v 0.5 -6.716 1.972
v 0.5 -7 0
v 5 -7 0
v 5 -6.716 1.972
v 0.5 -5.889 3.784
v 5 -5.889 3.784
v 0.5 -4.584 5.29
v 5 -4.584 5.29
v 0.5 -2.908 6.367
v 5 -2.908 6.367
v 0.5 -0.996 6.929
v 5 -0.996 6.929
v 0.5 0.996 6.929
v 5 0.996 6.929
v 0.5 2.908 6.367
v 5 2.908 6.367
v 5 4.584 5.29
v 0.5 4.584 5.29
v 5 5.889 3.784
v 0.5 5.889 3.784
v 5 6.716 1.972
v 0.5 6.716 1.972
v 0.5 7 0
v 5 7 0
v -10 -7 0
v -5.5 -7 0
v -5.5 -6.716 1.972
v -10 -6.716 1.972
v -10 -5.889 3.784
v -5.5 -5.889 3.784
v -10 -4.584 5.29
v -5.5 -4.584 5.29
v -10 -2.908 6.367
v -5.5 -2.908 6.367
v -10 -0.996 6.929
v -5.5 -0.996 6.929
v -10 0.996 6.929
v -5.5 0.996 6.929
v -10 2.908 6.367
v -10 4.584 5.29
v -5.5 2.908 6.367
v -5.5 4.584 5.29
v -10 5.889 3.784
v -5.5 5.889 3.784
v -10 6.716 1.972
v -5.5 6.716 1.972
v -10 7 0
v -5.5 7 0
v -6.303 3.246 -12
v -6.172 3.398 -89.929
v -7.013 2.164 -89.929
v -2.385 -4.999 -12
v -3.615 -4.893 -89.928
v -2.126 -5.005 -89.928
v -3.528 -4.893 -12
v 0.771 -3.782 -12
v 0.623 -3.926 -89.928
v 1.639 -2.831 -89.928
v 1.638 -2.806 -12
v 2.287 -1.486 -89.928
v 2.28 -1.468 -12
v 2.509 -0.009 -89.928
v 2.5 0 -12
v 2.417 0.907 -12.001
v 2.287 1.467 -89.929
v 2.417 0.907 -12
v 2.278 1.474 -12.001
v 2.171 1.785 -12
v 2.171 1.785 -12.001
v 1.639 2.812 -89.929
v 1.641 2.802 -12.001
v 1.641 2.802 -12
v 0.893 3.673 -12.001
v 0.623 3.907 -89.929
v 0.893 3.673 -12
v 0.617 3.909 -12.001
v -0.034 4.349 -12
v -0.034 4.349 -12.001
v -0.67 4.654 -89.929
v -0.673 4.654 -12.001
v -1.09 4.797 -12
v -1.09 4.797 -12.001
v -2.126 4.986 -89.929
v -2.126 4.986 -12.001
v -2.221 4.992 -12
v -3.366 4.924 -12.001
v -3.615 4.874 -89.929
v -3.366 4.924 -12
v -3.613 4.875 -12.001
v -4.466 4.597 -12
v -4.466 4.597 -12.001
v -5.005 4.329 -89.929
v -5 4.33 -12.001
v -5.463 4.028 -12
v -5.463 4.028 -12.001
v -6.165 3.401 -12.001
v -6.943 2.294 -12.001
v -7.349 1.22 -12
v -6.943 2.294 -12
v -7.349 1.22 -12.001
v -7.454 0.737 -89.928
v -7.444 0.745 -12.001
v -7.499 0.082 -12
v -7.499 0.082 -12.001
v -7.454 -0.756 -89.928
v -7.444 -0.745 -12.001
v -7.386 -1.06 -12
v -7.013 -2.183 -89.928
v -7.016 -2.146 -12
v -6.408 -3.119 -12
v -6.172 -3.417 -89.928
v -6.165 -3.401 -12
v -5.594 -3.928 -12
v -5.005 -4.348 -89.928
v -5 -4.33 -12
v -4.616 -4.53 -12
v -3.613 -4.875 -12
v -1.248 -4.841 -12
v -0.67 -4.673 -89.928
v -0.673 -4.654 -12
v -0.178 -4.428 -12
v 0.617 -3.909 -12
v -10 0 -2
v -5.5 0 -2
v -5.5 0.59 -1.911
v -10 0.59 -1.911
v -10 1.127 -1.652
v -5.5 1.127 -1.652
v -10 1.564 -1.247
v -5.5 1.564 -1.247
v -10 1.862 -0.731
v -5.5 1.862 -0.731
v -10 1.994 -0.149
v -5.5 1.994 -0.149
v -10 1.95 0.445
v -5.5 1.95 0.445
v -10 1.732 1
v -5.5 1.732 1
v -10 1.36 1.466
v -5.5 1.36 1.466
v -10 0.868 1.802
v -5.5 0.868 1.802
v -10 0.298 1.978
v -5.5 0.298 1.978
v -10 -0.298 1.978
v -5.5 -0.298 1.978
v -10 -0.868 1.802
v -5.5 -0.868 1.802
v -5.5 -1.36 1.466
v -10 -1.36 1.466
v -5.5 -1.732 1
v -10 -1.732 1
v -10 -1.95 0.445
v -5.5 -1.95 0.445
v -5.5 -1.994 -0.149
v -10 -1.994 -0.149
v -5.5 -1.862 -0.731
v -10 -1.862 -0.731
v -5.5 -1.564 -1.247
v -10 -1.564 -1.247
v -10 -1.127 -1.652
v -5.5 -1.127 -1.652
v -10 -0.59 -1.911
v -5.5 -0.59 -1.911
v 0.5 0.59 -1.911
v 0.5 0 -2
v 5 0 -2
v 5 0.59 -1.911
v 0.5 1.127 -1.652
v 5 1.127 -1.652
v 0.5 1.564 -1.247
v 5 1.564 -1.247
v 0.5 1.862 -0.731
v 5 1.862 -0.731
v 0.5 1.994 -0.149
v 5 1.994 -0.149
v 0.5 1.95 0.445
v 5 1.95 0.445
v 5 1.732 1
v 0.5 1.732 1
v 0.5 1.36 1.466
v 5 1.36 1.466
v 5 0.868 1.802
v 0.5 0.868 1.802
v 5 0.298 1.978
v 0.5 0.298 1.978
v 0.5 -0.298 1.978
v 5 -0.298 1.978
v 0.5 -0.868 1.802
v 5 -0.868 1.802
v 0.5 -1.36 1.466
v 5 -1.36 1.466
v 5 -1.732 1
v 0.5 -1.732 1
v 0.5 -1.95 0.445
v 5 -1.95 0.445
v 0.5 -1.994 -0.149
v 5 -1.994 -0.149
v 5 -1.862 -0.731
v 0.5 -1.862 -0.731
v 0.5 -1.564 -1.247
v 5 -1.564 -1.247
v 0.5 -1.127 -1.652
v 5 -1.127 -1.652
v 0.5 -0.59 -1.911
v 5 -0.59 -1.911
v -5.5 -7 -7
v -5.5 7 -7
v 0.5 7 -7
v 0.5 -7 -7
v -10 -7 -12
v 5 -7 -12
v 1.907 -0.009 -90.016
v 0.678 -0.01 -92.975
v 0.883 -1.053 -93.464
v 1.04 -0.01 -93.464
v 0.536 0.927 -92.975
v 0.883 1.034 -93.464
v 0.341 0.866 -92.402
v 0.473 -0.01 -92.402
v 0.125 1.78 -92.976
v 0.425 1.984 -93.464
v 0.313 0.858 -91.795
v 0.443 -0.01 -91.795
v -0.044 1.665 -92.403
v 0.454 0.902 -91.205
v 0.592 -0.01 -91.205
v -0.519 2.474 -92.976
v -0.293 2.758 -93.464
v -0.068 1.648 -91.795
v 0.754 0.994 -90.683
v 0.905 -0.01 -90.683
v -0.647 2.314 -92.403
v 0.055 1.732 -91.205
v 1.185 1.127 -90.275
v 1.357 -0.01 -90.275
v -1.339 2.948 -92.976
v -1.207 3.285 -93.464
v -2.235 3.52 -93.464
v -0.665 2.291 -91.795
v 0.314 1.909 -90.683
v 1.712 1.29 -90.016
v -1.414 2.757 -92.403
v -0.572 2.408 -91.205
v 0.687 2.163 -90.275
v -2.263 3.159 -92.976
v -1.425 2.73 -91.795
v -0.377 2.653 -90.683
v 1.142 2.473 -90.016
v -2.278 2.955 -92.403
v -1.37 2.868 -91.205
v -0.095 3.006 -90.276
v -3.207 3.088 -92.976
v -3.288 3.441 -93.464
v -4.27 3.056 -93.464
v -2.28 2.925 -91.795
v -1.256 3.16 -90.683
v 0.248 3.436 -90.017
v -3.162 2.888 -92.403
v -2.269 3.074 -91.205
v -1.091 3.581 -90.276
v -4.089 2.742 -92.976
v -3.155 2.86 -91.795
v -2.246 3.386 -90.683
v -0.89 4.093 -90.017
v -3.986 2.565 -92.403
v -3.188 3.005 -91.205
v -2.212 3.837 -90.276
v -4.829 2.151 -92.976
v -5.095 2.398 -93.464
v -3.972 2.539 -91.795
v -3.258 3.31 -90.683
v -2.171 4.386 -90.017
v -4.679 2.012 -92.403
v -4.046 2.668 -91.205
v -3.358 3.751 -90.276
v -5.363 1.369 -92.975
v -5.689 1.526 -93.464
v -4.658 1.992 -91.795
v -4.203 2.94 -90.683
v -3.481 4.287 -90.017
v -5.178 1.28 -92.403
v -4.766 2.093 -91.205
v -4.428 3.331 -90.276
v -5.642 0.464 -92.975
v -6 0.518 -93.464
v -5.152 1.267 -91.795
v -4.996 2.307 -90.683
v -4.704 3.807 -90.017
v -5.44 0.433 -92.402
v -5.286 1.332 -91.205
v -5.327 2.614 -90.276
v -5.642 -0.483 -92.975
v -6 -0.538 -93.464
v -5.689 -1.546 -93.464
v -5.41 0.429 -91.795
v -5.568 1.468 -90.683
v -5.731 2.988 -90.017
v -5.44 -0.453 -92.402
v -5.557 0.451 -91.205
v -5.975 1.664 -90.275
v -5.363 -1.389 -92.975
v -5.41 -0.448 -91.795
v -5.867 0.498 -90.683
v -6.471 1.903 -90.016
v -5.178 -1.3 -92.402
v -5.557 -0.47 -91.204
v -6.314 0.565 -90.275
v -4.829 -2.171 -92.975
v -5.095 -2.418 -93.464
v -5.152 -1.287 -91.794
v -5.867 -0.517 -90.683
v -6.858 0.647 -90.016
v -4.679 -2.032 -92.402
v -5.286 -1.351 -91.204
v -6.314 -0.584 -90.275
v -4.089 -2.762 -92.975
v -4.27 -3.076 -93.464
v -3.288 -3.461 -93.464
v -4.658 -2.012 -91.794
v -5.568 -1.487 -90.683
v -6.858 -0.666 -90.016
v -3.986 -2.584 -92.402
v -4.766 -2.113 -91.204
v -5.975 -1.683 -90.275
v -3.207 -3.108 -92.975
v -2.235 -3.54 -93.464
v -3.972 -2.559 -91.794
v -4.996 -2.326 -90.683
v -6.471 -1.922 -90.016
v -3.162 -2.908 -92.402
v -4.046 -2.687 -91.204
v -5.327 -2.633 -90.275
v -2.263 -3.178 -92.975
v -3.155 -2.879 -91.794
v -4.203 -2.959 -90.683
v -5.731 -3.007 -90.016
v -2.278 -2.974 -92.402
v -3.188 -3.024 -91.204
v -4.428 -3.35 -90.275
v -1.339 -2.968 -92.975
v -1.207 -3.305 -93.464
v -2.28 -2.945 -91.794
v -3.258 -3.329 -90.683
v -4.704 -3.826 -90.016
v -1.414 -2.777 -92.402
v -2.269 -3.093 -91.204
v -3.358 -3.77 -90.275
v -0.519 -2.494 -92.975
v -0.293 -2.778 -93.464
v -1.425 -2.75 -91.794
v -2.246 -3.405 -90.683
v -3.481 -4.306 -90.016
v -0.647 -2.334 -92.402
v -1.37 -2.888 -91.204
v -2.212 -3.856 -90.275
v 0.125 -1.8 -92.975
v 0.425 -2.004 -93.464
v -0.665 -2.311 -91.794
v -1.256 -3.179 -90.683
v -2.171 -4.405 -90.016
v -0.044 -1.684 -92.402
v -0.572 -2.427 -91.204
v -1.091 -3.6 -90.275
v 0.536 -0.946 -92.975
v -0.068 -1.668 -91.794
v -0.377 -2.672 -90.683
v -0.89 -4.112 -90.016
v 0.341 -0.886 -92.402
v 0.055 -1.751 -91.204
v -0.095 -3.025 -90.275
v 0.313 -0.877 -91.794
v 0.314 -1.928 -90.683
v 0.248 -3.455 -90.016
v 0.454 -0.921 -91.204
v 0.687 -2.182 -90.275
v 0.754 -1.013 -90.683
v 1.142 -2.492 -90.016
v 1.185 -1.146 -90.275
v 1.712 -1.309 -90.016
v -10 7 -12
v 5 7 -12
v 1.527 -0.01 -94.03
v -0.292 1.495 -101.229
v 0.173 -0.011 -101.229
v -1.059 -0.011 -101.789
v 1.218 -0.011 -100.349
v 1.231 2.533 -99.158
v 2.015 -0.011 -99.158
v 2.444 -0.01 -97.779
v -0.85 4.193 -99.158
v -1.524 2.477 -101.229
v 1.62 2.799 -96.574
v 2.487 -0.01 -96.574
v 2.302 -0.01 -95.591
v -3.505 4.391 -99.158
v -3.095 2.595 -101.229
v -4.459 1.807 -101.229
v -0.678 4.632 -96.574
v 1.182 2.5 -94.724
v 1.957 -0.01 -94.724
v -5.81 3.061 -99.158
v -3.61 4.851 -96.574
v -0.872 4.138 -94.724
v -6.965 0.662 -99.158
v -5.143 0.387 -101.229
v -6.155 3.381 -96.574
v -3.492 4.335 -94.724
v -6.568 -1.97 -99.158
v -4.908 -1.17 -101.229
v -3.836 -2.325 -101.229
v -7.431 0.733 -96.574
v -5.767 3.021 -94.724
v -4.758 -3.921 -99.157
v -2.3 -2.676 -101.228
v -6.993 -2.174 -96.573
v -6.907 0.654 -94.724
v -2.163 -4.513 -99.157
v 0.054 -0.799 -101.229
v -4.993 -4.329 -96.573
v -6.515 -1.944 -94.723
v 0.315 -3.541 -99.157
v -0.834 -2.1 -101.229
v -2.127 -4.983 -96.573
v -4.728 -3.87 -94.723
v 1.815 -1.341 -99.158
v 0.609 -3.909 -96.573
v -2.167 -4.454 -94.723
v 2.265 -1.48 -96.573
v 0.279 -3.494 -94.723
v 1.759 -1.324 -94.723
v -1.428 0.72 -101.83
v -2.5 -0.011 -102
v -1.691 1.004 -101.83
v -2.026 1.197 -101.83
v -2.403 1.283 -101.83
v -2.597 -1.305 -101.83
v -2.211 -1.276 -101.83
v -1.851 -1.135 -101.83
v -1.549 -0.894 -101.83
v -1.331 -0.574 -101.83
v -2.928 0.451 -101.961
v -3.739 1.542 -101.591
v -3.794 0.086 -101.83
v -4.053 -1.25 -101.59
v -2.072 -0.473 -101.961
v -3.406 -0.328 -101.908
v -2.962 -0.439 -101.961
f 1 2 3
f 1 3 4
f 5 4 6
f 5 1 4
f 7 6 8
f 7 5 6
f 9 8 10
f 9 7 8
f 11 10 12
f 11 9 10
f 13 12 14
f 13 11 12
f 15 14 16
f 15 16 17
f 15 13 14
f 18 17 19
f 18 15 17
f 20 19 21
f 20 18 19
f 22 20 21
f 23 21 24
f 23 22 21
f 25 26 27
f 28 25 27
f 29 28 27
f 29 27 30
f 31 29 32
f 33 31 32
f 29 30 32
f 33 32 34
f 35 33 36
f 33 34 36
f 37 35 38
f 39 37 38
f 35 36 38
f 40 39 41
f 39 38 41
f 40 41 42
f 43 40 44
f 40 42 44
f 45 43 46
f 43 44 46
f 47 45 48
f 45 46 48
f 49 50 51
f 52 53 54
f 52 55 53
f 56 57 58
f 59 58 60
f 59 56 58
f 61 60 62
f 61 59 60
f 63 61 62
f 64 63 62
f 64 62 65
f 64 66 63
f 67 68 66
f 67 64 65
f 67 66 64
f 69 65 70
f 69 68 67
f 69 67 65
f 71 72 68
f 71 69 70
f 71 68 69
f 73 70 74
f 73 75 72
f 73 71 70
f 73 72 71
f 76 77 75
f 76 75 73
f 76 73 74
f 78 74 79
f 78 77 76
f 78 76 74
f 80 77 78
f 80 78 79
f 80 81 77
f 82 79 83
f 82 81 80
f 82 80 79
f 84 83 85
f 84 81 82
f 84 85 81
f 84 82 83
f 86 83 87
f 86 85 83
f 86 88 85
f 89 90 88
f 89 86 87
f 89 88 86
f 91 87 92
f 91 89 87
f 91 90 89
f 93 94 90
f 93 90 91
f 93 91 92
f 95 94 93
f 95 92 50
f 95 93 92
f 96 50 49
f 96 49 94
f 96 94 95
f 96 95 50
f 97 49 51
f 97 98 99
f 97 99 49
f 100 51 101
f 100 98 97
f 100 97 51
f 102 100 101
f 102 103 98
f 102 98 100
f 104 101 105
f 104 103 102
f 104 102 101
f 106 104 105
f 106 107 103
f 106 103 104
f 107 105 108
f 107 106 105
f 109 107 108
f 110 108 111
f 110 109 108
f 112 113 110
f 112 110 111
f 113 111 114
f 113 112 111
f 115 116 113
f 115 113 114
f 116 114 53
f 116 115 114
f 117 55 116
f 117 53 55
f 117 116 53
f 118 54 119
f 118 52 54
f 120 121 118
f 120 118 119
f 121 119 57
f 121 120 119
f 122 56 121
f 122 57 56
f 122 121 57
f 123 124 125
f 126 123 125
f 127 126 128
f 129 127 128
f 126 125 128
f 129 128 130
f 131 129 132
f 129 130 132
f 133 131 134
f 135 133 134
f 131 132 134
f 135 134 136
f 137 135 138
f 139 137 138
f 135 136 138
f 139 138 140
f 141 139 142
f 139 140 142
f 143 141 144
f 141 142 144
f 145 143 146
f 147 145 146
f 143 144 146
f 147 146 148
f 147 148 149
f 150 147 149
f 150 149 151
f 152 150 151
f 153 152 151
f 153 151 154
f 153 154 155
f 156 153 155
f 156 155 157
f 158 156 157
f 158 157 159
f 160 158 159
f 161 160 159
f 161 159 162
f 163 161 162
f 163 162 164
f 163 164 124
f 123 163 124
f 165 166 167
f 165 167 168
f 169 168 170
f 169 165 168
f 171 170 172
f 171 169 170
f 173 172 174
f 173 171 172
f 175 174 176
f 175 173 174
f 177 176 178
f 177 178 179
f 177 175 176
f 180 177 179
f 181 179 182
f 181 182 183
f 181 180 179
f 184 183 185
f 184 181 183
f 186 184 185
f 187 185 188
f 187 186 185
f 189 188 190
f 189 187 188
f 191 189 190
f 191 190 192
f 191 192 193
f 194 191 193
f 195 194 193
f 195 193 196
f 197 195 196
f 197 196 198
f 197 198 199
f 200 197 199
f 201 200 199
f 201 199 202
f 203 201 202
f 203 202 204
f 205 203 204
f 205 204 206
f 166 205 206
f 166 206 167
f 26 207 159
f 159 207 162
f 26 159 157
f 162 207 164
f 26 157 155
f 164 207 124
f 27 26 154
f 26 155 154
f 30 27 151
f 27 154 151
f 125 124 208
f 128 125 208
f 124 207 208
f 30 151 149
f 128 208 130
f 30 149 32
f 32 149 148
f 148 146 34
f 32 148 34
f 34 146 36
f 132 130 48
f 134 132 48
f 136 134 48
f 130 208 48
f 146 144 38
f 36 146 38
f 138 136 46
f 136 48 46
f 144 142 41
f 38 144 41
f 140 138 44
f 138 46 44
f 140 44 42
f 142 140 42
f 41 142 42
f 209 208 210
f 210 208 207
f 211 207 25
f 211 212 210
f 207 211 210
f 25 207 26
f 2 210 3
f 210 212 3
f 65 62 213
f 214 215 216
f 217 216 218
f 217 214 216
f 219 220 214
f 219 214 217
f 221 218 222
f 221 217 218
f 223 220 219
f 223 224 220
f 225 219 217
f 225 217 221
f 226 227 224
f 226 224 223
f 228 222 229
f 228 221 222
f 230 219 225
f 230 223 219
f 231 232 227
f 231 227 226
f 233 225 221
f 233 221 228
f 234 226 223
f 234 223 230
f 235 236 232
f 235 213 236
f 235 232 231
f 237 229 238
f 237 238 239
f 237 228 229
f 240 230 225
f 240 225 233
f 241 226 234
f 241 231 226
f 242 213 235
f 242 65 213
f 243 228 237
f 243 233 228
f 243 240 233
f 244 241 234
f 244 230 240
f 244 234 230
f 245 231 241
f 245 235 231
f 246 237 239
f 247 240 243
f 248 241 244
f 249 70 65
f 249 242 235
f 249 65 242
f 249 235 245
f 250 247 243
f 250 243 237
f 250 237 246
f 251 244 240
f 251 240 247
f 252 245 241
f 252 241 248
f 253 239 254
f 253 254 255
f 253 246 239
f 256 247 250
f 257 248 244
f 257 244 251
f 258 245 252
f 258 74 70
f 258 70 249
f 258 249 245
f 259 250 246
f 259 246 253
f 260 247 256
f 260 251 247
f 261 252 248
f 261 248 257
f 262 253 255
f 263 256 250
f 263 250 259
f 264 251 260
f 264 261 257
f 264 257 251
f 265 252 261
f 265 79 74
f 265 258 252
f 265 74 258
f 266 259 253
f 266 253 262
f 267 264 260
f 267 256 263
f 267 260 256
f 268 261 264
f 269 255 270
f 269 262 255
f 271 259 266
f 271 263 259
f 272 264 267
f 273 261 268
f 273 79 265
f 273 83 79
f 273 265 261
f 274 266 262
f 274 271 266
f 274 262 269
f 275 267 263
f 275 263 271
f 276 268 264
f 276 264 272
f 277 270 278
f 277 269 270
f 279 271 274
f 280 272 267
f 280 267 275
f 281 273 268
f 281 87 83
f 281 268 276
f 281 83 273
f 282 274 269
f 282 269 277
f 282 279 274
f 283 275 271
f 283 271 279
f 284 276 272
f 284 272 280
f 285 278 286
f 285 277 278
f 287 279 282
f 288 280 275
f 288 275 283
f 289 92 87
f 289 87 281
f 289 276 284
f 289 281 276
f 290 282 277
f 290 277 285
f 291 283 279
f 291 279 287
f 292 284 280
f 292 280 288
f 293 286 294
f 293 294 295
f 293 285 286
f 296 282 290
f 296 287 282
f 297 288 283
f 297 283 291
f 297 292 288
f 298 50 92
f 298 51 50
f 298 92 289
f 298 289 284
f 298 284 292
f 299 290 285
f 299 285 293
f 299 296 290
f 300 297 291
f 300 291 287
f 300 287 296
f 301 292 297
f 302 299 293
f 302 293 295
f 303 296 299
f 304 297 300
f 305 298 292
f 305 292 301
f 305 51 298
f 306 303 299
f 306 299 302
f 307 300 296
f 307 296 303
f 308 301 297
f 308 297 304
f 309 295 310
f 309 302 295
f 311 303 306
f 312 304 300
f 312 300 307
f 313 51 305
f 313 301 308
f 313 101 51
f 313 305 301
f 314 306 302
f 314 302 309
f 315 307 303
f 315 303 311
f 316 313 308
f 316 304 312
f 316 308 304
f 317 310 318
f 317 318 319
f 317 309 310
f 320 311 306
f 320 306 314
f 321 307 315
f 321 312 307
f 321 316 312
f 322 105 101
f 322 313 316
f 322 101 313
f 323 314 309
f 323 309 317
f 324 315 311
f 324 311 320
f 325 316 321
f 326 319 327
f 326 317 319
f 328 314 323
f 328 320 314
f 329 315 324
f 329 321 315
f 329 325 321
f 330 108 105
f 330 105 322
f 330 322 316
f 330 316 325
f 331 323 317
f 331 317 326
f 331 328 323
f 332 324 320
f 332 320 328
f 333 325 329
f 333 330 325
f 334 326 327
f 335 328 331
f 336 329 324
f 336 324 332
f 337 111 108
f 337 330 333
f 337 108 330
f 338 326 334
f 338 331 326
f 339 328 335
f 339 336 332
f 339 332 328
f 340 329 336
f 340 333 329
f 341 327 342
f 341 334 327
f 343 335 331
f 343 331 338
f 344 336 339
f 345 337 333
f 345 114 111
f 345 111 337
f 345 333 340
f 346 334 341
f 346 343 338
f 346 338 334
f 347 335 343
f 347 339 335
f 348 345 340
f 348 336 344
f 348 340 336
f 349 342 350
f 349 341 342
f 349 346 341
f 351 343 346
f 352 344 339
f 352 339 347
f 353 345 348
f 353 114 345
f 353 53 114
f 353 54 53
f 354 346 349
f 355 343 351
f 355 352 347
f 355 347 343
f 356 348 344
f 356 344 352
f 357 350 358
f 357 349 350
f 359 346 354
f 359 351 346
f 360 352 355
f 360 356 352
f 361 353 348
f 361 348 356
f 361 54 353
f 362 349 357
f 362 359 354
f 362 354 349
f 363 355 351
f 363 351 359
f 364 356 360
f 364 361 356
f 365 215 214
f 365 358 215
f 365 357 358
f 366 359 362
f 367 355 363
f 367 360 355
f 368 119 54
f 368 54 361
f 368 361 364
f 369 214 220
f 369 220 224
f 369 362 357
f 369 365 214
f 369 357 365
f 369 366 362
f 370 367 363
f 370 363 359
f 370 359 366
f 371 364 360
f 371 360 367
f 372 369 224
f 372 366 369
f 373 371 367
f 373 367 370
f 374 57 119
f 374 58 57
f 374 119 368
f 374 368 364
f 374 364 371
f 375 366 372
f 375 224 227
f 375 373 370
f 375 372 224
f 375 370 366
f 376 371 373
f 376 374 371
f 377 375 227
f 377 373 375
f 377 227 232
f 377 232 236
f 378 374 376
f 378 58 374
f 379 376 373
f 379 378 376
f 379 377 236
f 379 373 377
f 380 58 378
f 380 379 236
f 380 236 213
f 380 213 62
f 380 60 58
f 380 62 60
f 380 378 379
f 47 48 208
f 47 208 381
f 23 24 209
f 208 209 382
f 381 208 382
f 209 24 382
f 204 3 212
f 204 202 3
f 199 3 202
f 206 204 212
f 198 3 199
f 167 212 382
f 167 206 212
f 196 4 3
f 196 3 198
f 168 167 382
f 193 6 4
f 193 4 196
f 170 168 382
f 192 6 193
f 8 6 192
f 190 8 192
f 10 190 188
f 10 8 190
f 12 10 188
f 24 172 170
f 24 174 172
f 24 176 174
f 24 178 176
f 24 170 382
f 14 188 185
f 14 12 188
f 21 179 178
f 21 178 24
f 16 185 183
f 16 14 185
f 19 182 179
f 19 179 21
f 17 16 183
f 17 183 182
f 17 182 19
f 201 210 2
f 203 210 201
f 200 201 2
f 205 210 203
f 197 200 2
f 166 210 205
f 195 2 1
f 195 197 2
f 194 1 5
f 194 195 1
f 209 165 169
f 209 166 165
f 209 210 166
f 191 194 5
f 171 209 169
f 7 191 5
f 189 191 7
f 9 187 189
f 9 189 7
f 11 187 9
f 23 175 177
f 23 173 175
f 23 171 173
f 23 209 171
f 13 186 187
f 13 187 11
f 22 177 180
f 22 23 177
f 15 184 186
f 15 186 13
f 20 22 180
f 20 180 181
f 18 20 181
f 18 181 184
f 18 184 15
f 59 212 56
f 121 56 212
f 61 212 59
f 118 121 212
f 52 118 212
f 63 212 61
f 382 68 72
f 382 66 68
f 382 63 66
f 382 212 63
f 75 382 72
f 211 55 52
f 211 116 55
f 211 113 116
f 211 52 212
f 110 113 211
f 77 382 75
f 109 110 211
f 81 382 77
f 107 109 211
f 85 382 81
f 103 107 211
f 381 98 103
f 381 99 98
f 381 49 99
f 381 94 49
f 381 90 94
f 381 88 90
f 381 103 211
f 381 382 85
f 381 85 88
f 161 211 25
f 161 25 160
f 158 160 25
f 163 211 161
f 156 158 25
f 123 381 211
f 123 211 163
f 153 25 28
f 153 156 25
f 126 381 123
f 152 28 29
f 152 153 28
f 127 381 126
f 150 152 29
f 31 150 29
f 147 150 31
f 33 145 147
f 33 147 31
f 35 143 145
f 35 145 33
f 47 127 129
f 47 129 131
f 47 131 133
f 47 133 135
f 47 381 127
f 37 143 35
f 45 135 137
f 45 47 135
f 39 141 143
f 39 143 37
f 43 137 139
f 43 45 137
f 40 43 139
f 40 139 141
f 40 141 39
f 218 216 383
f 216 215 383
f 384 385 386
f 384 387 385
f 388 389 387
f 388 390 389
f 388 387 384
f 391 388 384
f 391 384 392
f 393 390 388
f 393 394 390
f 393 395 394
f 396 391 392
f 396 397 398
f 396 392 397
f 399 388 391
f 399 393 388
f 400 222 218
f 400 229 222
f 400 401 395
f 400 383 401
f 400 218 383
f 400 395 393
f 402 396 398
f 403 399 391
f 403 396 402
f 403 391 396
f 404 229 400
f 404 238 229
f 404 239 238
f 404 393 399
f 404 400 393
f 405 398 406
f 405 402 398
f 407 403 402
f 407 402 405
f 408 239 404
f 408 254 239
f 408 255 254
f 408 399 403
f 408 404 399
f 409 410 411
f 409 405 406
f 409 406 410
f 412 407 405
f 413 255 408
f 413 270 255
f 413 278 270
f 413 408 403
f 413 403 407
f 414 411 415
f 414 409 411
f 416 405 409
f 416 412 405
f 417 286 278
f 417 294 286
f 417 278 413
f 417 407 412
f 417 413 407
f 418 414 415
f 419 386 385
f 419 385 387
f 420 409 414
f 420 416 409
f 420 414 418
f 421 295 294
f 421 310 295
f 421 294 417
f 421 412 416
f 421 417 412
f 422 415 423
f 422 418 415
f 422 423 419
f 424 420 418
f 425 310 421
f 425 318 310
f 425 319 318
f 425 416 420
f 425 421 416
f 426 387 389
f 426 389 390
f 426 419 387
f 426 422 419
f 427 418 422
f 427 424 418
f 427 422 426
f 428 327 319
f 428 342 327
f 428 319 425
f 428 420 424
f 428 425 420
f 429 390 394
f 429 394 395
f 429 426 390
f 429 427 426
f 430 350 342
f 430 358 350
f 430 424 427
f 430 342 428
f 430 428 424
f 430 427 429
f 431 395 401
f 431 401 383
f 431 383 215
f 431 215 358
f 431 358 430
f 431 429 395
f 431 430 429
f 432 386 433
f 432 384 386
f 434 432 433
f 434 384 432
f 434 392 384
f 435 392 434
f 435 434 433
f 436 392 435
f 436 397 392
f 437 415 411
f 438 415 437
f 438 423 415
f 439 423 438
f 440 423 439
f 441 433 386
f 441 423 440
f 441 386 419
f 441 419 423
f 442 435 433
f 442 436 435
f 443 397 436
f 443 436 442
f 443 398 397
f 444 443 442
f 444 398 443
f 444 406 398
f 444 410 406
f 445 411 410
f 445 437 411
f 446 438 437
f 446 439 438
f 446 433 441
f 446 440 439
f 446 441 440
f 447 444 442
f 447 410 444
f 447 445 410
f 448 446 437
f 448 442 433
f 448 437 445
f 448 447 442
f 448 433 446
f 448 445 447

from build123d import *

# Parameters (mm, degrees)
SKETCH_1_R          = 2
EXTRUDE_1_DEPTH     = 5
SKETCH_2_W          = 15
SKETCH_2_H          = 14
EXTRUDE_2_DEPTH     = 5
CUT_EXTRUDE_1_DEPTH = 0.5
CUT_EXTRUDE_2_DEPTH = 0.5


# Read off the part's stored shape, not the designer's step: 旋转1
with BuildPart() as part:
    # 草图1 → 凸台-拉伸1 (new body)
    with BuildSketch(Plane(origin=(0, 0, 0), x_dir=(0, 0, -1), z_dir=(1, 0, 0))):
        with BuildLine():
            Line((0, 7), (7, 7))
            Line((7, 7), (7, -7))
            Line((7, -7), (0, -7))
            ThreePointArc((0, -7), (-7, 0), (0, 7))
        make_face()
        Circle(SKETCH_1_R, mode=Mode.SUBTRACT)
    extrude_1 = extrude(amount=EXTRUDE_1_DEPTH)

    # 草图2 → 凸台-拉伸2 (add)
    with BuildSketch(Plane(origin=(0, 0, -7), x_dir=(-1, 0, 0), z_dir=(0, 0, -1))):
        with Locations((2.5, 0)):
            Rectangle(SKETCH_2_W, SKETCH_2_H)
    extrude(amount=EXTRUDE_2_DEPTH)

    # 镜向1: 凸台-拉伸1 across plane
    add(extrude_1.mirror(Plane(origin=(-2.5, 0, 0), x_dir=(0, 0, 1), z_dir=(1, 0, 0))))

    # 旋转1 outline → 旋转1 (revolve)
    with BuildSketch(Plane(origin=(-2.5, 0.001459035, -1.77e-07), x_dir=(1, 0, 0), z_dir=(0, -0.9999999926083961, 0.00012158621526376601))):
        with BuildLine():
            Line((0, -11.99939198), (0, -101.999999911))
            add(Edge.make_bspline(
                [(0, -101.999999911), (0.649374565, -102.000631552), (1.36637391, -101.896134883), (2.14664433, -101.640285677), (2.900713445, -101.175064609), (4.050280545, -100.025777019), (4.488587079, -99.403162649), (4.802259983, -98.694270687), (4.967920299, -97.947271844), (5.003923175, -97.131598303), (5.005854013, -97.042976085), (5.00581972, -96.954701862), (5.003854844, -96.866858155), (4.962482411, -95.929533068), (4.746118591, -95.128843425), (4.388787557, -94.446984897), (3.976314487, -93.90027946), (3.539967456, -93.464038525)],
                knots=[7.026698353, 7.026698353, 7.026698353, 7.026698353, 7.026698353, 7.026698353, 7.854954324, 7.854954324, 7.854954324, 7.854954324, 8.516146676, 8.516146676, 8.516146676, 8.516146676, 8.597007798, 8.597007798, 8.597007798, 8.597007798, 9.38398712, 9.38398712, 9.38398712, 9.38398712, 9.38398712, 9.38398712], degree=5, weights=[1, 1, 1.002166416, 1.000644588, 1, 1, 0.998171528, 0.998141501, 1, 1, 0.999999762, 0.999999775, 1, 1, 1.000698327, 1.001864653, 1, 1]))
            ThreePointArc((3.539967456, -93.464038525), (3.091790234, -91.204536808), (5.009475048, -89.928333148))
            Line((5.009475048, -89.928333148), (4.999999963, -11.99939198))
            Line((4.999999963, -11.99939198), (0, -11.99939198))
        make_face()
    revolve(axis=Axis((-2.5, 0.001459035, -1.77e-07), (0, 0.00012158621526376601, 0.9999999926083961)))

    # 草图5 → 切除-拉伸1 (cut)
    with BuildSketch(Plane.ZY):
        with BuildLine():
            Line((-7, 7), (-7, -7))
            Line((-7, -7), (0, -7))
            ThreePointArc((0, -7), (7, 0), (0, 7))
            Line((0, 7), (-7, 7))
        make_face()
    extrude(amount=-CUT_EXTRUDE_1_DEPTH, mode=Mode.SUBTRACT)


with BuildPart() as mirror_2_1:
    # 镜向2: 凸台-拉伸1 across plane
    add(extrude_1.mirror(Plane(origin=(-2.5, 0, 0), x_dir=(0, 0, 1), z_dir=(1, 0, 0))))


with BuildPart() as part_1:
    add(part.part)

    # 镜向2 united with what the copies tou: union 镜向2_1
    add(mirror_2_1.part)

    # 草图6 → 切除-拉伸2 (cut)
    with BuildSketch(Plane(origin=(-5, 0, 0), x_dir=(0, 0, -1), z_dir=(1, 0, 0))):
        with BuildLine():
            Line((0, 7), (7, 7))
            Line((7, 7), (7, -7))
            Line((7, -7), (0, -7))
            ThreePointArc((0, -7), (-7, 0), (0, 7))
        make_face()
    extrude(amount=-CUT_EXTRUDE_2_DEPTH, mode=Mode.SUBTRACT)


solid = part_1.part
